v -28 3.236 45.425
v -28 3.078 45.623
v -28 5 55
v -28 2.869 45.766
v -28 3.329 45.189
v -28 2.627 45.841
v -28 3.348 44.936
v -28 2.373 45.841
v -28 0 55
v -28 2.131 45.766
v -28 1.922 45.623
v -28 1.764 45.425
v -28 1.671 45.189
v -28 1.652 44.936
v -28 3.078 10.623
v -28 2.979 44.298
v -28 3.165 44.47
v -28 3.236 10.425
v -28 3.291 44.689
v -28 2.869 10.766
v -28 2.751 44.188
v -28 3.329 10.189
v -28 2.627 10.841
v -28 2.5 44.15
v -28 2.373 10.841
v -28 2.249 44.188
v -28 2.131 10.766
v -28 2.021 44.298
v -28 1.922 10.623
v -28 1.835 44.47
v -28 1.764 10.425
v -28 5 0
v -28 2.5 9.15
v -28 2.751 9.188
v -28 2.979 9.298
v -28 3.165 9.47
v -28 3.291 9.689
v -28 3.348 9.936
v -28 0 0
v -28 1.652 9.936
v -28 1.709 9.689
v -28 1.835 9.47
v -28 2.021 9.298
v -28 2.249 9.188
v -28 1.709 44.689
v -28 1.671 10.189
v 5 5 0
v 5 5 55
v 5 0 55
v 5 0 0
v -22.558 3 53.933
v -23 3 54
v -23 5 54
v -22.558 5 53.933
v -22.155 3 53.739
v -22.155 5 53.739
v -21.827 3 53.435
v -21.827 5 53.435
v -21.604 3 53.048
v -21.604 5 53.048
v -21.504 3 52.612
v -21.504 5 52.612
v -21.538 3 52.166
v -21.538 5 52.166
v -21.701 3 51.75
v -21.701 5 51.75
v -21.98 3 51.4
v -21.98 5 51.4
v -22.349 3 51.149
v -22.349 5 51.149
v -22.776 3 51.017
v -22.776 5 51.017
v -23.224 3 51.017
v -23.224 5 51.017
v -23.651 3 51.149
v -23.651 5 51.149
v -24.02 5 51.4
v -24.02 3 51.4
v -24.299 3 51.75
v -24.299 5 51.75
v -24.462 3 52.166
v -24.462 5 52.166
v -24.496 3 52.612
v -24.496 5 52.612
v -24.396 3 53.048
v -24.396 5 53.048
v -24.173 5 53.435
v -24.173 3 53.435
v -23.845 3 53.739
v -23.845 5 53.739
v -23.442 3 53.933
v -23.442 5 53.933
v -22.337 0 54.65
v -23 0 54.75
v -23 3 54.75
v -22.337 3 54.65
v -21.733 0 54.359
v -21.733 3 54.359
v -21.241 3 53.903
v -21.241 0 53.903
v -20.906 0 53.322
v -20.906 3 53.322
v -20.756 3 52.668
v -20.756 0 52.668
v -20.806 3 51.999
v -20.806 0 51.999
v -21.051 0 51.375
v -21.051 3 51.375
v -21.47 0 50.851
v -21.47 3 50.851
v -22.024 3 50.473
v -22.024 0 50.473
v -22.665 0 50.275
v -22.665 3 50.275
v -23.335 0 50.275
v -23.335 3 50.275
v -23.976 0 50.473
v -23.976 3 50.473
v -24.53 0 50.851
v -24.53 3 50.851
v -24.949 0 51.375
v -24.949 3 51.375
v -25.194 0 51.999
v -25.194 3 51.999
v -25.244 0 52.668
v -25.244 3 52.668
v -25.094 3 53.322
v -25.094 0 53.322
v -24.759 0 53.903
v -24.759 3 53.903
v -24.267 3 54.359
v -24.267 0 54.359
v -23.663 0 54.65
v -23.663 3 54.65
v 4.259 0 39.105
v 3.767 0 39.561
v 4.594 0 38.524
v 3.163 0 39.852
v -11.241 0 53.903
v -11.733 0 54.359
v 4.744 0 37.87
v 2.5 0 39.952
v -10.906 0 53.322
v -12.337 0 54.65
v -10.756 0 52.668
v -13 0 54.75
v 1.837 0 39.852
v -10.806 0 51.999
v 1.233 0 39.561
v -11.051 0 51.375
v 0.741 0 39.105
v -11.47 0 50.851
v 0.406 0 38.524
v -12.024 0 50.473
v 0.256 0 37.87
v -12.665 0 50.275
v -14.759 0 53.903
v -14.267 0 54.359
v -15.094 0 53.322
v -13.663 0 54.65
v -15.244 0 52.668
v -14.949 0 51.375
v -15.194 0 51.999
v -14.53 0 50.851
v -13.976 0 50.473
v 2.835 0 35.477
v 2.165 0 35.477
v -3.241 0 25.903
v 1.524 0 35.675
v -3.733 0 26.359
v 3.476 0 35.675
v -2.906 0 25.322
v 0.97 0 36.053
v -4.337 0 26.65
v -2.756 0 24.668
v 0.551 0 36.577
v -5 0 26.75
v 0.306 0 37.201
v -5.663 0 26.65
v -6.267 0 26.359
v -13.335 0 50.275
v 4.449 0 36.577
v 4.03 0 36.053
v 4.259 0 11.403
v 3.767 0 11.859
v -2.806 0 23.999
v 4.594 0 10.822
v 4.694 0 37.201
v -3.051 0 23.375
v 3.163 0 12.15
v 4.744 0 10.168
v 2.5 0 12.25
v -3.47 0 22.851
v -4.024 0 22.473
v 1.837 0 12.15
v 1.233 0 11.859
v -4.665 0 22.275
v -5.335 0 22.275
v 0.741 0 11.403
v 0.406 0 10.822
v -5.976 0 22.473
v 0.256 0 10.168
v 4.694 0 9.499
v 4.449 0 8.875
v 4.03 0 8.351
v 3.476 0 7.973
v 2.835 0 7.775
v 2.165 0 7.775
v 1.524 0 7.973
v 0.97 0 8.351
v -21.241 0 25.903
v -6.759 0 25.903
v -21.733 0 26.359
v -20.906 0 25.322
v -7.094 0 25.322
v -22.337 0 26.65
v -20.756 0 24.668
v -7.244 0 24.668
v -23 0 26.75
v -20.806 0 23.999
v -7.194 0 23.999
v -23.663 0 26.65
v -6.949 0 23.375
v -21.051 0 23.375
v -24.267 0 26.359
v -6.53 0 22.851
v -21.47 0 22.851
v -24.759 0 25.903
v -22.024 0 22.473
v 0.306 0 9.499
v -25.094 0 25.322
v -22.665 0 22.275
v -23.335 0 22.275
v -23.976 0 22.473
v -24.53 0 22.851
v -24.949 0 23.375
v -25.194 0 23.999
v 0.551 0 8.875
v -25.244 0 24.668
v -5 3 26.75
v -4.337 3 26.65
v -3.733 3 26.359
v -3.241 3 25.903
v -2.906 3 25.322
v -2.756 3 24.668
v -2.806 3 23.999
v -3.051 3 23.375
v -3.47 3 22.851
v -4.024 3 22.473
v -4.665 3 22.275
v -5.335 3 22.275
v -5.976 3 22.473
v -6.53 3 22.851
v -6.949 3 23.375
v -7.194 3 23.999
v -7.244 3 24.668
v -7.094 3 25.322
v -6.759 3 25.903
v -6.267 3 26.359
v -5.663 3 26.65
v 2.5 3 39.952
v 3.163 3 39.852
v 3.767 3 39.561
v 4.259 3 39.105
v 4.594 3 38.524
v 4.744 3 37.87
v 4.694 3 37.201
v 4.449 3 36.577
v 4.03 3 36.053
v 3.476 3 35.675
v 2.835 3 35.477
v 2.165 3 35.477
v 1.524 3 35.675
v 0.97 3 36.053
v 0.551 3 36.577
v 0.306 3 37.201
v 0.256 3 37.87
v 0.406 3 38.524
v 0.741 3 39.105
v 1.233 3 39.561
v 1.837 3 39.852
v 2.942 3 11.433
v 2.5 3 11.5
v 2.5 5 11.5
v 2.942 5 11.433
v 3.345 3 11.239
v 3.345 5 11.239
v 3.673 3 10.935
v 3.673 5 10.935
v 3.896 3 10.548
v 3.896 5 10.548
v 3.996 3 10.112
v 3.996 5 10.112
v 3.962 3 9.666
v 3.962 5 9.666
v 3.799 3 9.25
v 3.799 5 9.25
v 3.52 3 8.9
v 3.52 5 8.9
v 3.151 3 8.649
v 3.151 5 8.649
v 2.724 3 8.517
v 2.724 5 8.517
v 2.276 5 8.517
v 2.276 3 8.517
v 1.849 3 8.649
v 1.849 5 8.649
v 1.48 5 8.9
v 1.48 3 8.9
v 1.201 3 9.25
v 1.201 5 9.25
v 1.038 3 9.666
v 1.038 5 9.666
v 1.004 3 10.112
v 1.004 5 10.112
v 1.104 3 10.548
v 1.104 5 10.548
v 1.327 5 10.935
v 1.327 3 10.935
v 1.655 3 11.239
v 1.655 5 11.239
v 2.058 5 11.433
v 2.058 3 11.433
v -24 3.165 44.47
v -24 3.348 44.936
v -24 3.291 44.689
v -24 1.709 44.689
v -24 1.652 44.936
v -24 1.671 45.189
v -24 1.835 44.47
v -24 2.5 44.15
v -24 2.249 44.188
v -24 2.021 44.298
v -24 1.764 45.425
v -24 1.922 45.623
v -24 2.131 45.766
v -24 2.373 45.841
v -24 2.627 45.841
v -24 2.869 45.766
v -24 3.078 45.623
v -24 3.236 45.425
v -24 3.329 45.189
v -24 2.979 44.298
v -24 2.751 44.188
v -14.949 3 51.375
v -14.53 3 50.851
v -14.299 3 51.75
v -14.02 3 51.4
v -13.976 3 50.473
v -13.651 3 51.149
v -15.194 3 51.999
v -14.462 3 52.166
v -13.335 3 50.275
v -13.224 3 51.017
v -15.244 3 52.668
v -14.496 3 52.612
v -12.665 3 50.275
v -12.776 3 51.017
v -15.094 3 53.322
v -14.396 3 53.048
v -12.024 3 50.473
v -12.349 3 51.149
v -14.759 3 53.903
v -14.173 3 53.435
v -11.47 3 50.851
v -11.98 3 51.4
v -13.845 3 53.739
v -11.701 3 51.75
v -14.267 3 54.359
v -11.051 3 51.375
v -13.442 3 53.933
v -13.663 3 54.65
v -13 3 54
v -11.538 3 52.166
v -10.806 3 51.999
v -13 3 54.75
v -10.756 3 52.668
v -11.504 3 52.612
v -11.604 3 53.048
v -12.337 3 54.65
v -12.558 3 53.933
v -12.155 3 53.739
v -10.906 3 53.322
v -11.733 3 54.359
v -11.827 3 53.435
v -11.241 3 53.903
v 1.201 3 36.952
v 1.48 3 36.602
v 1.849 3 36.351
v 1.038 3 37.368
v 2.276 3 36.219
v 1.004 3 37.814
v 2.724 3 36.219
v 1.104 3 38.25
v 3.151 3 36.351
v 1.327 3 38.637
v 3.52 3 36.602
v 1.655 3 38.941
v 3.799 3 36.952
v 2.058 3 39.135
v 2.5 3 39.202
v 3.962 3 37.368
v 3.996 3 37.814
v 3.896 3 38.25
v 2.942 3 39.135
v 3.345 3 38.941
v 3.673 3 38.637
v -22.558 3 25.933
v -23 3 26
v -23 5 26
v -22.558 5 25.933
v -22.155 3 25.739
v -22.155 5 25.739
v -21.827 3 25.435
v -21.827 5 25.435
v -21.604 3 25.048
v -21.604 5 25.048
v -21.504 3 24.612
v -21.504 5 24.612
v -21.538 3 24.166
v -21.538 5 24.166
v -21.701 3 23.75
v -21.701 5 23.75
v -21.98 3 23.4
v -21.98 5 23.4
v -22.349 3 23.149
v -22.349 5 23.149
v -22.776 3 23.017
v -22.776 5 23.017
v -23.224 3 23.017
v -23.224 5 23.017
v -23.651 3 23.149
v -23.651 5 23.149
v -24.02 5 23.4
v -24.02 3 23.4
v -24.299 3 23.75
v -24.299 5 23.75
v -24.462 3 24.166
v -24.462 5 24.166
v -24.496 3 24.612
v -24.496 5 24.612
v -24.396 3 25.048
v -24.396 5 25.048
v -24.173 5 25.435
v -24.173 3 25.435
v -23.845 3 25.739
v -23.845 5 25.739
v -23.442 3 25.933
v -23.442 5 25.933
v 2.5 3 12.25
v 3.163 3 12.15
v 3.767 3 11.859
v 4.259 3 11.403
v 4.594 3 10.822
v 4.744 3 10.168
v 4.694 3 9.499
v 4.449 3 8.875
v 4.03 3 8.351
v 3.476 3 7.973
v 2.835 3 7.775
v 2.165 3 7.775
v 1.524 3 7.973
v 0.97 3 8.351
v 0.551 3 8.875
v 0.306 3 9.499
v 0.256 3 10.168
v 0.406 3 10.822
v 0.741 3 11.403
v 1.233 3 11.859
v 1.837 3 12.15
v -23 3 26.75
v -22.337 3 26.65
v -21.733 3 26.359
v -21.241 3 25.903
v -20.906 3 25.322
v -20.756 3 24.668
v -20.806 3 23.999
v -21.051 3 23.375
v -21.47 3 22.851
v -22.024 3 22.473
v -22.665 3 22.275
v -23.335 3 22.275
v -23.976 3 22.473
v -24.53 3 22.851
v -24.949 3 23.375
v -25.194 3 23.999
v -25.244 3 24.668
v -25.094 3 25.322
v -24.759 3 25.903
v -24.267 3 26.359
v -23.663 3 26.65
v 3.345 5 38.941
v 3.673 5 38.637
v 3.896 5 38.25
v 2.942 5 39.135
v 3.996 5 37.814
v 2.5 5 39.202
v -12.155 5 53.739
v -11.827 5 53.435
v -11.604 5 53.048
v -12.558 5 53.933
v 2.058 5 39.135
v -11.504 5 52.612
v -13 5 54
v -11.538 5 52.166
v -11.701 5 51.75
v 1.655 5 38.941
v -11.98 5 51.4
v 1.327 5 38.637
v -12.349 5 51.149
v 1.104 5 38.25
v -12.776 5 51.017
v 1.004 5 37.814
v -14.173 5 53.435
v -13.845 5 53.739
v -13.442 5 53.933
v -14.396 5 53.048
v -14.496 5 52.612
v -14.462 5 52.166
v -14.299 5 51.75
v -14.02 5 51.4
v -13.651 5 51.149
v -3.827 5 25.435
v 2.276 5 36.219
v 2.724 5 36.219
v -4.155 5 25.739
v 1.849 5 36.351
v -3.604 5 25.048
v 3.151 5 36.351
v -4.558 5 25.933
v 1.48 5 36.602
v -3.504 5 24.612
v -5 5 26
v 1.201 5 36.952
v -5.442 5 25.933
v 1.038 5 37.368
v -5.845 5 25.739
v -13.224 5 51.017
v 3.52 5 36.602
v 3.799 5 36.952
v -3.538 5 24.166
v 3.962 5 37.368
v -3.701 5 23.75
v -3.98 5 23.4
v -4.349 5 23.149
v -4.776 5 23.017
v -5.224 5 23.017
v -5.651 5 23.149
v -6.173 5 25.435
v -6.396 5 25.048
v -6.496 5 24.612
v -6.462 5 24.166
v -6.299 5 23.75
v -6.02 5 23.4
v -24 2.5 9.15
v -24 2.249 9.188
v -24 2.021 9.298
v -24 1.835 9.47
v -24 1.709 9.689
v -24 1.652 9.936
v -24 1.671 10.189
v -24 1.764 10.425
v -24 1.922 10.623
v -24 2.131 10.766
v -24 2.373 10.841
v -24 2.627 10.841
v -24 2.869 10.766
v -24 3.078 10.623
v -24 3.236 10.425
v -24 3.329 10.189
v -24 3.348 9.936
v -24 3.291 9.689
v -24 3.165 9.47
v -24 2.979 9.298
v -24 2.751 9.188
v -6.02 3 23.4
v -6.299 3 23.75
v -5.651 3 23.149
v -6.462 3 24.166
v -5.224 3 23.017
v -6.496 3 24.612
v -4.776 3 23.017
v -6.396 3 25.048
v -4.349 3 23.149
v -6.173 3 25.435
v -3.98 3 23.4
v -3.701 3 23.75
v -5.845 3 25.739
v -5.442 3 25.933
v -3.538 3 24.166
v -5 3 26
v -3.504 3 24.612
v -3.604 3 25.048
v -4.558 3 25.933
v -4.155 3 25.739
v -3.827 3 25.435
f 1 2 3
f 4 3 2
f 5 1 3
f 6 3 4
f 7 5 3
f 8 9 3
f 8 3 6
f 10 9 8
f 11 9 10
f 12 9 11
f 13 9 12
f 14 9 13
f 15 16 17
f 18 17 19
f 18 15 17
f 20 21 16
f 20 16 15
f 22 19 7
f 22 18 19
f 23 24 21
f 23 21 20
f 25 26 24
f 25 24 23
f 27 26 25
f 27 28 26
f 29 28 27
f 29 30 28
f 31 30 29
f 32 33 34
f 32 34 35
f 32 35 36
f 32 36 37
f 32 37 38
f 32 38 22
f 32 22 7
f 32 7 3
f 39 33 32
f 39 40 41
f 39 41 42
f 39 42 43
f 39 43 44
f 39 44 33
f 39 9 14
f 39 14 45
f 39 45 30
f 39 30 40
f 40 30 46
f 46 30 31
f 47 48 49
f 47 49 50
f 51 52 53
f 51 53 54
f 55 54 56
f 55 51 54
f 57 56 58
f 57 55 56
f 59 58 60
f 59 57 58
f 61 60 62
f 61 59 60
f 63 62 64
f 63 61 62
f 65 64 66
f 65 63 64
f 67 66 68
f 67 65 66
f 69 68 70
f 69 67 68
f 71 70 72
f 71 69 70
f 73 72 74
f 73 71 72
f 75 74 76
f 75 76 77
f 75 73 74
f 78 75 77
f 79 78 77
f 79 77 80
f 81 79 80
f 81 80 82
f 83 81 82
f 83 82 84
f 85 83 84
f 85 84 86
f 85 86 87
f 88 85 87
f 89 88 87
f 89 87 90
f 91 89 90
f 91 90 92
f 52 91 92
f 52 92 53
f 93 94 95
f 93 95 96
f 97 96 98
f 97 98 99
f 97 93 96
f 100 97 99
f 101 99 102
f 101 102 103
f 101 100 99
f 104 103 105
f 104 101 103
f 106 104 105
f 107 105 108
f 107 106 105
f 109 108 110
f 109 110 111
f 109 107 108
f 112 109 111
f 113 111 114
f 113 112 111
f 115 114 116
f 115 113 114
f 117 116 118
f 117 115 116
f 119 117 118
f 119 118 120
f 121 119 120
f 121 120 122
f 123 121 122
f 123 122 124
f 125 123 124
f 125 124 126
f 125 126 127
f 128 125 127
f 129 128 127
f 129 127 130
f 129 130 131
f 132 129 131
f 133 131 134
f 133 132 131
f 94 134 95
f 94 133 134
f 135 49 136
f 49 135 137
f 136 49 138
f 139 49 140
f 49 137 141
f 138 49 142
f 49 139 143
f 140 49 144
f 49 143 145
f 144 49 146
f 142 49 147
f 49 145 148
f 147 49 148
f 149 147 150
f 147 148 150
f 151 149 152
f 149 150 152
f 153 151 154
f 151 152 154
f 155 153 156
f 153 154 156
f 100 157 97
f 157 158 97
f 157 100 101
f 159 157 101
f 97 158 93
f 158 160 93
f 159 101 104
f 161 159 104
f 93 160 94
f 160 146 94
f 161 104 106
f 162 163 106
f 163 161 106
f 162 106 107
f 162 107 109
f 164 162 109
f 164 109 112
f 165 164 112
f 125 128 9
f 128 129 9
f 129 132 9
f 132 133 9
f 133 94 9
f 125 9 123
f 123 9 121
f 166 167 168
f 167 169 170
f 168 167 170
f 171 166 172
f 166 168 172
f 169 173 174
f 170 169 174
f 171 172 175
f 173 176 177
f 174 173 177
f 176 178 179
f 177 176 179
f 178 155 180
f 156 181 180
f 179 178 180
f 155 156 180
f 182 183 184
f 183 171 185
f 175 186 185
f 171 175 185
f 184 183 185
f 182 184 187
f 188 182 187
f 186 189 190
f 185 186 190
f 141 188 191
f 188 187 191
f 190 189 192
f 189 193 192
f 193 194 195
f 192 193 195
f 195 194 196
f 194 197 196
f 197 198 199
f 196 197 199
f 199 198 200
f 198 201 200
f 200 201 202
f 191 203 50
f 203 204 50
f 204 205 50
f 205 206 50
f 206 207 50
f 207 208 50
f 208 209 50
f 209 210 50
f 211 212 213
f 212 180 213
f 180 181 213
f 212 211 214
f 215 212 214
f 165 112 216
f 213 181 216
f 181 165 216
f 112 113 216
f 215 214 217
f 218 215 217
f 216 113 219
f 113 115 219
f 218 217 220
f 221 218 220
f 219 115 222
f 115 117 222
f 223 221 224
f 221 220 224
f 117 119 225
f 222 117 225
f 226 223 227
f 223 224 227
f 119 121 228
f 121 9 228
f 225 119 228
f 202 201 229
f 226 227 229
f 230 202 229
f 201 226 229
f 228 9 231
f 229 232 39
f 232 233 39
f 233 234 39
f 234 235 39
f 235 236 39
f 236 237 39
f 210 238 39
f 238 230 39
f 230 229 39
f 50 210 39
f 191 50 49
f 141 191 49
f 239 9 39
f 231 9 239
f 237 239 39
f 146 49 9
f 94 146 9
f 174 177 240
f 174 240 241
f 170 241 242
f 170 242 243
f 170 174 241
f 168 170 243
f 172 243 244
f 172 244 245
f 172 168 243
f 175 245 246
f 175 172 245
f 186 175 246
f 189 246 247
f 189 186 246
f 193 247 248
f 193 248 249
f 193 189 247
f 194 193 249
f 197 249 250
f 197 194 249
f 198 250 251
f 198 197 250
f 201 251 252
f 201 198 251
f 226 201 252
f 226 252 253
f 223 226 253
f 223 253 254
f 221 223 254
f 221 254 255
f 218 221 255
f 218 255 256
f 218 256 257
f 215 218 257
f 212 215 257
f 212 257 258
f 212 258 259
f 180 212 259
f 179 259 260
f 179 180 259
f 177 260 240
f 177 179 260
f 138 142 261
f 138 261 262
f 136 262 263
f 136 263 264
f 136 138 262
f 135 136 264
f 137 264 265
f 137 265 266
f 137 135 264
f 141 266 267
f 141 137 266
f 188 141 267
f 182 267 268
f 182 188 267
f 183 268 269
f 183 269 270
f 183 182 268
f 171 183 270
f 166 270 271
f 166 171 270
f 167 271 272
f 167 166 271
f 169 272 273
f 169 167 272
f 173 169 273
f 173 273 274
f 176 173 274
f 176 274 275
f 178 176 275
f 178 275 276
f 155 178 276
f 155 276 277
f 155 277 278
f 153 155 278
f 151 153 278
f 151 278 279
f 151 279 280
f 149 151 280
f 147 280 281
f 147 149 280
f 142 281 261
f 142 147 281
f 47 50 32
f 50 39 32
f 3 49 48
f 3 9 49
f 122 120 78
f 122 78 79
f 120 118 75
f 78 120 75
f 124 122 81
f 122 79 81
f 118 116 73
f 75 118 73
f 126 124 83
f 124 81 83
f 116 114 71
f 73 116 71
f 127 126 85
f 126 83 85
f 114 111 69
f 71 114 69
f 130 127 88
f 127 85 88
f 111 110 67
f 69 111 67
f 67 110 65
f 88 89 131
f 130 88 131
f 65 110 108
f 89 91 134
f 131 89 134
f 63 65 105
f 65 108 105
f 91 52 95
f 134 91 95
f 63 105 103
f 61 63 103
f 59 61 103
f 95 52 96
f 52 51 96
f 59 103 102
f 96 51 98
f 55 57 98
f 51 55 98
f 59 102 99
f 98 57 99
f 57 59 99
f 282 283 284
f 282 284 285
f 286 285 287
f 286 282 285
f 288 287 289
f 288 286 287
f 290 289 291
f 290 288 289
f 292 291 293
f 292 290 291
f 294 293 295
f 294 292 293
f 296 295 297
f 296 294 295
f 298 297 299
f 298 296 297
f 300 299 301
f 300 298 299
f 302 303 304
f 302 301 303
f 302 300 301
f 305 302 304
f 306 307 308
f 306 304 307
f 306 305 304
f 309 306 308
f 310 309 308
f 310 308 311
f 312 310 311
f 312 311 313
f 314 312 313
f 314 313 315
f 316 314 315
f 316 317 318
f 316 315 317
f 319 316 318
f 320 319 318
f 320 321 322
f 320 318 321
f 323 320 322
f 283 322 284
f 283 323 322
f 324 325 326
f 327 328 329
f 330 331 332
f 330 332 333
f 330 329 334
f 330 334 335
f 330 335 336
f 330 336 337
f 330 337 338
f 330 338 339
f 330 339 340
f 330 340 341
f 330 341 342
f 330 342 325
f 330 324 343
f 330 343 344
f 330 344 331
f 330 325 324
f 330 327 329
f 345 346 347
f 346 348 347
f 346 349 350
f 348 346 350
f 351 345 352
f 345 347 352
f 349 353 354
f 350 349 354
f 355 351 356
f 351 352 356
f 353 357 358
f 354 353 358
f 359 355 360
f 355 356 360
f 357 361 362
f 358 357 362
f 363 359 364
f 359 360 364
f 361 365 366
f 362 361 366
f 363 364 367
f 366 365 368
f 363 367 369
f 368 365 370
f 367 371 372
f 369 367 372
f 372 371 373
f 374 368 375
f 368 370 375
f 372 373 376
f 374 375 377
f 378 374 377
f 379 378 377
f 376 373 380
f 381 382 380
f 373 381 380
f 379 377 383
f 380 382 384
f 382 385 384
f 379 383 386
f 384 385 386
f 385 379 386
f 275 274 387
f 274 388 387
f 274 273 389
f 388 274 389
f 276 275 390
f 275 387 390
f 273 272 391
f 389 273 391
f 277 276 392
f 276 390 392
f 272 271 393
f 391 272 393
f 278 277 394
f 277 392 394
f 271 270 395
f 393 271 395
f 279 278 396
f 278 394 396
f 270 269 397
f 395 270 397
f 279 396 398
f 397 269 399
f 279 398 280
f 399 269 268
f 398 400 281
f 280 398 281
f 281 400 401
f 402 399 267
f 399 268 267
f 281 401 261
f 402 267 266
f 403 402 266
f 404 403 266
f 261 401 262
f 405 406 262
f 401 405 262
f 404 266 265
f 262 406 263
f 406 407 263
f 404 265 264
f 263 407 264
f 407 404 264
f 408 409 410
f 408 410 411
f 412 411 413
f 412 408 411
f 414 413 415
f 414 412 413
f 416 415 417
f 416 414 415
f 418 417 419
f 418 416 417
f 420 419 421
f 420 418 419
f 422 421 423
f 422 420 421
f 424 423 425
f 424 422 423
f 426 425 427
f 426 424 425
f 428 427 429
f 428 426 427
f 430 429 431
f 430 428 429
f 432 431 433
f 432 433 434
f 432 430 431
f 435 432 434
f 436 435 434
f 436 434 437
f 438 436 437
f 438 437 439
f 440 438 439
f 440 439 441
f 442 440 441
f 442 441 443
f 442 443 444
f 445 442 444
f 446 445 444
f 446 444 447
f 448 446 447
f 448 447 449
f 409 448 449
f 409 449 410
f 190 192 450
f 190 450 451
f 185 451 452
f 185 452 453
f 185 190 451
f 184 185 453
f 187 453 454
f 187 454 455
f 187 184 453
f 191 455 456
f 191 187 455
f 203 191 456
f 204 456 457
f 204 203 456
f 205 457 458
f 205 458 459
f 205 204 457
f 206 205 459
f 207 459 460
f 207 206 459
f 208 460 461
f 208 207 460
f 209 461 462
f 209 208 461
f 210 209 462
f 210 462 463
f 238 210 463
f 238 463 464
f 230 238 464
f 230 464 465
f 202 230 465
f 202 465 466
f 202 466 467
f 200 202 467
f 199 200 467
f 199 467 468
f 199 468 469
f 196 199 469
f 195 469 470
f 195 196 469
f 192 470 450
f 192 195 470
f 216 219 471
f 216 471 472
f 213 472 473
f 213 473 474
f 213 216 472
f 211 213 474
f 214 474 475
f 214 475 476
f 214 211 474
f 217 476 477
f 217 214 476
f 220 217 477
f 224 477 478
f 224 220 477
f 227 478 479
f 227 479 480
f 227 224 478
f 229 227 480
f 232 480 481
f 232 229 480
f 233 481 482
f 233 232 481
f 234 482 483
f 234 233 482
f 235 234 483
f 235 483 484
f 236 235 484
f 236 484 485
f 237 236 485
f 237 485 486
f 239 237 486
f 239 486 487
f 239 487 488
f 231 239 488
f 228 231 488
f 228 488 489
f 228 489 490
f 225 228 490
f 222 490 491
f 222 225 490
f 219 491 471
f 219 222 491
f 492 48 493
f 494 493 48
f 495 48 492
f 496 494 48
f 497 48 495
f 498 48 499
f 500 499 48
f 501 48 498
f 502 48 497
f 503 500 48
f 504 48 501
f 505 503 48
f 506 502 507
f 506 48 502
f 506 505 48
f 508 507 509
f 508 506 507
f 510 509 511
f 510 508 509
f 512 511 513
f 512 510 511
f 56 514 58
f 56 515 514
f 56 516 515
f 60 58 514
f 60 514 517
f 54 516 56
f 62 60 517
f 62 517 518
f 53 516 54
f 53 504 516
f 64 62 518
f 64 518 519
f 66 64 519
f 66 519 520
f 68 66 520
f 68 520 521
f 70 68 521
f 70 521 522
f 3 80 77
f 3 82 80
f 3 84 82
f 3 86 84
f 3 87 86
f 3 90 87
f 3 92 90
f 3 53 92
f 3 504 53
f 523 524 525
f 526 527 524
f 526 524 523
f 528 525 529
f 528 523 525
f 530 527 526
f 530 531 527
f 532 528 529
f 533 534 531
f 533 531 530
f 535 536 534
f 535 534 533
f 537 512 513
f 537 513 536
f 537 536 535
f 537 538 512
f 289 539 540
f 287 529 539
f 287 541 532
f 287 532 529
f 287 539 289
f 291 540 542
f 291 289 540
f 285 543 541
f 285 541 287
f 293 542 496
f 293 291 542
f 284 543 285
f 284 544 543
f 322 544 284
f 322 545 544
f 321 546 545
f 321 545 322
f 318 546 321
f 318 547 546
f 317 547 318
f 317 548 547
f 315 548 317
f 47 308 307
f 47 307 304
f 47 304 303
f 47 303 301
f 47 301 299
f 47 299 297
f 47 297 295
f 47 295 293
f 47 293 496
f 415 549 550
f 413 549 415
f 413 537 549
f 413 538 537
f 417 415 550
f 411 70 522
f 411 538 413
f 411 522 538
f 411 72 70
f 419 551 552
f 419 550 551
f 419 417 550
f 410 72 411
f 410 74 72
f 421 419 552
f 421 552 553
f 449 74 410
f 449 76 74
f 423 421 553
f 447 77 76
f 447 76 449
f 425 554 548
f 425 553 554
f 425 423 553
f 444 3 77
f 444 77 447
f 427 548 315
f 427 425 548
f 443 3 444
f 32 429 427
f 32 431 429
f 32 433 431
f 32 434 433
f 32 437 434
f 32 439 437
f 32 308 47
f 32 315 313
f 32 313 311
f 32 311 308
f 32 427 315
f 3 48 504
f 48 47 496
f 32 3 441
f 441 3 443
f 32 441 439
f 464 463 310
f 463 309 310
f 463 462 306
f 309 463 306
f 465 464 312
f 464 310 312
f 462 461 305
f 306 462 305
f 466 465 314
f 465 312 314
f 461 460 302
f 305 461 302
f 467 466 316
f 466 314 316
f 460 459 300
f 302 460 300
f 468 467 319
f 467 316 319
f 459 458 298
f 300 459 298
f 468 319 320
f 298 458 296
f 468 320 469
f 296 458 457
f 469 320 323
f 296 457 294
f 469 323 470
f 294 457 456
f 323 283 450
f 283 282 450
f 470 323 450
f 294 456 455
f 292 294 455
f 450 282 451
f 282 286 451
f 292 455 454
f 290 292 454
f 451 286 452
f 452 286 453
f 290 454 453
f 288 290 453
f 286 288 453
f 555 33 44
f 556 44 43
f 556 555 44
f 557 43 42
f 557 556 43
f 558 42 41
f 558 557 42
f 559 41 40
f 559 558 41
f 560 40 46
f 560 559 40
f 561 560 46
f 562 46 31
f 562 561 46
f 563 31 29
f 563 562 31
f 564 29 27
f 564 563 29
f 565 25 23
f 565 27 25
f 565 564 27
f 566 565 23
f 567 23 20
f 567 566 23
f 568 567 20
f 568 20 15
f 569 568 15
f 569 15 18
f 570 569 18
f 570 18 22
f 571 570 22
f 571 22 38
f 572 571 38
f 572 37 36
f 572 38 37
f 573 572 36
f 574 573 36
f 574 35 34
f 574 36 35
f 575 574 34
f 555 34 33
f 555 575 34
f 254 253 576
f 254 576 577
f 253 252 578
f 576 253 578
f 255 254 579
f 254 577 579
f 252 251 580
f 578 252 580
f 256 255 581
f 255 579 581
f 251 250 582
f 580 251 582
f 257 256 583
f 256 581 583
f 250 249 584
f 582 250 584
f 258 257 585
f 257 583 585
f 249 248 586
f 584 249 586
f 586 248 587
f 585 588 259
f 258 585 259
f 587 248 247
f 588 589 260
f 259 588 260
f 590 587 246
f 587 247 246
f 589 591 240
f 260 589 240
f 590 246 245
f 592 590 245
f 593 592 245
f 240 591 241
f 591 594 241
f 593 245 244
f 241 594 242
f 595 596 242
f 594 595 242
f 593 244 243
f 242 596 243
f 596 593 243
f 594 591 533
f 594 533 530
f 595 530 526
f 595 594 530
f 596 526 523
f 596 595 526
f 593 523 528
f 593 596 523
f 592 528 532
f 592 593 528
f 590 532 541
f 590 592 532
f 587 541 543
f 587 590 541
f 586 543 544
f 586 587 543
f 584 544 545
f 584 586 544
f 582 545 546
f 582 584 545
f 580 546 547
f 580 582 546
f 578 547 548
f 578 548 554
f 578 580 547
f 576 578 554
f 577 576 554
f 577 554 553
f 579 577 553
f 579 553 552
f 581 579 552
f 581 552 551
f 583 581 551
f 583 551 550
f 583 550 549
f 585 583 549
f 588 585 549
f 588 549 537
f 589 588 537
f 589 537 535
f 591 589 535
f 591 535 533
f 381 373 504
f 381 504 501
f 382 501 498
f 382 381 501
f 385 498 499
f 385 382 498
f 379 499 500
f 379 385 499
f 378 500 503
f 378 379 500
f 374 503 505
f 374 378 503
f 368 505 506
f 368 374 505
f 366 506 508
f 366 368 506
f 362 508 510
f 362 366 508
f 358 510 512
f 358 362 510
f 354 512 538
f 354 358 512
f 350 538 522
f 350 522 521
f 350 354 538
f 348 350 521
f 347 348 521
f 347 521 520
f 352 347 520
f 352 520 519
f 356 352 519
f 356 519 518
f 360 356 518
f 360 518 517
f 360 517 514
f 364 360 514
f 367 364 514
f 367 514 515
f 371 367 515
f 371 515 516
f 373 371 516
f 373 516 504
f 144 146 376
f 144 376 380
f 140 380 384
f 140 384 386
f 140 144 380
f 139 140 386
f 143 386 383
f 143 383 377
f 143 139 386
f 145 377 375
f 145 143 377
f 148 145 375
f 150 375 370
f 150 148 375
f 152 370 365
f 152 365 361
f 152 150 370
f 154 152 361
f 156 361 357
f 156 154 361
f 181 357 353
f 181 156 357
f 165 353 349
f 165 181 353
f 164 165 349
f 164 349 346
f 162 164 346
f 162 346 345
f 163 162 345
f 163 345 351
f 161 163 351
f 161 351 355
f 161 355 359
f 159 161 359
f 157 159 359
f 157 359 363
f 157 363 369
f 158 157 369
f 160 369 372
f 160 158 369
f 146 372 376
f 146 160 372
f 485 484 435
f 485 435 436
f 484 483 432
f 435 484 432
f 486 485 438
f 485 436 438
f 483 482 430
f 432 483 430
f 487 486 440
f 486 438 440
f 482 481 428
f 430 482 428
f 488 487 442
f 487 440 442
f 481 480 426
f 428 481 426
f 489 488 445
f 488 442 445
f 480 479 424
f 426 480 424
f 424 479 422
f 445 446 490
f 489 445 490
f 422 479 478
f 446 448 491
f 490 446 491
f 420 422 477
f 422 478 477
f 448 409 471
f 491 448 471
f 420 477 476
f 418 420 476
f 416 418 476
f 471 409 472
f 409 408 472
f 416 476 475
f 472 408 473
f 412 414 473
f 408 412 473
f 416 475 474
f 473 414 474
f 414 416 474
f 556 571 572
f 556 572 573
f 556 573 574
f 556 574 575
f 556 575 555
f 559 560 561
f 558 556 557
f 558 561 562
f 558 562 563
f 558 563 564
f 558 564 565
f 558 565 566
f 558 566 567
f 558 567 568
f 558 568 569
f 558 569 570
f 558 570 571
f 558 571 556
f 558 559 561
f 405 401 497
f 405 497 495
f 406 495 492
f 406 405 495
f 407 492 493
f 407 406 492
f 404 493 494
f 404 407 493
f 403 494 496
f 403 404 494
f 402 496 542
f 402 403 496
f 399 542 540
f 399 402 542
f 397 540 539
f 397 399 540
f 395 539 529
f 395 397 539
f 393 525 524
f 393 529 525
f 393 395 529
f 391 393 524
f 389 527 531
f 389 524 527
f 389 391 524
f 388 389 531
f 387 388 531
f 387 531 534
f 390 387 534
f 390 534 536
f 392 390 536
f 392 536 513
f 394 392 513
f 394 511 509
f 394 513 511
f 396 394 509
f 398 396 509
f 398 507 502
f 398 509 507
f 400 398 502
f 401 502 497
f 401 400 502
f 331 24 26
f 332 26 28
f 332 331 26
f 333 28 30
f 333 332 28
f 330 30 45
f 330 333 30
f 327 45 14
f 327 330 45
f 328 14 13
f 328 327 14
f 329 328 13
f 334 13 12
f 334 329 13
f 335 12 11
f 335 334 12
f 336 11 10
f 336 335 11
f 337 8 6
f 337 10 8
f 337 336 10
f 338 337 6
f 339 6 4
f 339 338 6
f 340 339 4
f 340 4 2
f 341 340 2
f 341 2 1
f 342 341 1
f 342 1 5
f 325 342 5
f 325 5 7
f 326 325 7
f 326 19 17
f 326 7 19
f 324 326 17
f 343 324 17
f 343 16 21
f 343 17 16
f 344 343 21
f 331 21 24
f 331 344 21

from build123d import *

# Parameters (mm, degrees)
SKETCH_1_W               = 28
SKETCH_1_H               = 55
SKETCH_1_R               = 1.5
EXTRUDE_1_DEPTH          = 5
CUT_EXTRUDE_1_DEPTH      = 62.919302322
CUT_EXTRUDE_1_DEPTH_BACK = 4
SKETCH_4_R               = 0.85
SKETCH_5_W               = 55
SKETCH_5_H               = 5
EXTRUDE_2_DEPTH          = 5
SKETCH_1_22_R            = 1.5
CUT_EXTRUDE_2_DEPTH      = 62.919302322
SKETCH_1_23_R            = 2.25
CUT_EXTRUDE_3_DEPTH      = 3


with BuildPart() as part:
    # 草图1 → 凸台-拉伸1 (new body)
    with BuildSketch(Plane(origin=(0, 0, 0), x_dir=(1, 0, 0), z_dir=(0, 1, 0))):
        with Locations((-14, -27.5)):
            Rectangle(SKETCH_1_W, SKETCH_1_H)
        with Locations(Location((-23, -24.5, 0), (0, 0, 270))):
            Circle(SKETCH_1_R, mode=Mode.SUBTRACT)
        with Locations(Location((-5, -24.5, 0), (0, 0, 270))):
            Circle(SKETCH_1_R, mode=Mode.SUBTRACT)
        with Locations(Location((-13, -52.5, 0), (0, 0, 270))):
            Circle(SKETCH_1_R, mode=Mode.SUBTRACT)
        with Locations(Location((-23, -52.5, 0), (0, 0, 270))):
            Circle(SKETCH_1_R, mode=Mode.SUBTRACT)
    extrude(amount=EXTRUDE_1_DEPTH)

    # 草图4 → 切除-拉伸1 (cut, two sides: drawn at the far end of the back side and taken through both)
    with BuildSketch(Plane.ZY.offset(28).offset(-CUT_EXTRUDE_1_DEPTH_BACK)):
        with Locations(Location((10, 2.5, 0), (0, 0, 180))):
            Circle(SKETCH_4_R)
        with Locations(Location((45, 2.5, 0), (0, 0, 180))):
            Circle(SKETCH_4_R)
    extrude(amount=CUT_EXTRUDE_1_DEPTH + CUT_EXTRUDE_1_DEPTH_BACK, mode=Mode.SUBTRACT)

    # 草图5 → 凸台-拉伸2 (add)
    with BuildSketch(Plane(origin=(0, 0, 0), x_dir=(0, 0, -1), z_dir=(1, 0, 0))):
        with Locations((-27.5, 2.5)):
            Rectangle(SKETCH_5_W, SKETCH_5_H)
    extrude(amount=EXTRUDE_2_DEPTH)

    # 草图1<22> → 切除-拉伸2 (cut, through all)
    with BuildSketch(Plane(origin=(0, 0, 0), x_dir=(1, 0, 0), z_dir=(0, 1, 0))):
        with Locations(Location((2.5, -37.701964887, 0), (0, 0, 270))):
            Circle(SKETCH_1_22_R)
        with Locations(Location((2.5, -10, 0), (0, 0, 270))):
            Circle(SKETCH_1_22_R)
    extrude(amount=CUT_EXTRUDE_2_DEPTH, mode=Mode.SUBTRACT)

    # 草图1<23> → 切除-拉伸3 (cut)
    with BuildSketch(Plane(origin=(0, 0, 0), x_dir=(1, 0, 0), z_dir=(0, 1, 0))):
        with Locations(Location((-23, -24.5, 0), (0, 0, 270))):
            Circle(SKETCH_1_23_R)
        with Locations(Location((-5, -24.5, 0), (0, 0, 270))):
            Circle(SKETCH_1_23_R)
        with Locations(Location((-13, -52.5, 0), (0, 0, 270))):
            Circle(SKETCH_1_23_R)
        with Locations(Location((2.5, -37.701964887, 0), (0, 0, 270))):
            Circle(SKETCH_1_23_R)
        with Locations(Location((-23, -52.5, 0), (0, 0, 270))):
            Circle(SKETCH_1_23_R)
        with Locations(Location((2.5, -10, 0), (0, 0, 270))):
            Circle(SKETCH_1_23_R)
    extrude(amount=CUT_EXTRUDE_3_DEPTH, mode=Mode.SUBTRACT)


solid = part.part
